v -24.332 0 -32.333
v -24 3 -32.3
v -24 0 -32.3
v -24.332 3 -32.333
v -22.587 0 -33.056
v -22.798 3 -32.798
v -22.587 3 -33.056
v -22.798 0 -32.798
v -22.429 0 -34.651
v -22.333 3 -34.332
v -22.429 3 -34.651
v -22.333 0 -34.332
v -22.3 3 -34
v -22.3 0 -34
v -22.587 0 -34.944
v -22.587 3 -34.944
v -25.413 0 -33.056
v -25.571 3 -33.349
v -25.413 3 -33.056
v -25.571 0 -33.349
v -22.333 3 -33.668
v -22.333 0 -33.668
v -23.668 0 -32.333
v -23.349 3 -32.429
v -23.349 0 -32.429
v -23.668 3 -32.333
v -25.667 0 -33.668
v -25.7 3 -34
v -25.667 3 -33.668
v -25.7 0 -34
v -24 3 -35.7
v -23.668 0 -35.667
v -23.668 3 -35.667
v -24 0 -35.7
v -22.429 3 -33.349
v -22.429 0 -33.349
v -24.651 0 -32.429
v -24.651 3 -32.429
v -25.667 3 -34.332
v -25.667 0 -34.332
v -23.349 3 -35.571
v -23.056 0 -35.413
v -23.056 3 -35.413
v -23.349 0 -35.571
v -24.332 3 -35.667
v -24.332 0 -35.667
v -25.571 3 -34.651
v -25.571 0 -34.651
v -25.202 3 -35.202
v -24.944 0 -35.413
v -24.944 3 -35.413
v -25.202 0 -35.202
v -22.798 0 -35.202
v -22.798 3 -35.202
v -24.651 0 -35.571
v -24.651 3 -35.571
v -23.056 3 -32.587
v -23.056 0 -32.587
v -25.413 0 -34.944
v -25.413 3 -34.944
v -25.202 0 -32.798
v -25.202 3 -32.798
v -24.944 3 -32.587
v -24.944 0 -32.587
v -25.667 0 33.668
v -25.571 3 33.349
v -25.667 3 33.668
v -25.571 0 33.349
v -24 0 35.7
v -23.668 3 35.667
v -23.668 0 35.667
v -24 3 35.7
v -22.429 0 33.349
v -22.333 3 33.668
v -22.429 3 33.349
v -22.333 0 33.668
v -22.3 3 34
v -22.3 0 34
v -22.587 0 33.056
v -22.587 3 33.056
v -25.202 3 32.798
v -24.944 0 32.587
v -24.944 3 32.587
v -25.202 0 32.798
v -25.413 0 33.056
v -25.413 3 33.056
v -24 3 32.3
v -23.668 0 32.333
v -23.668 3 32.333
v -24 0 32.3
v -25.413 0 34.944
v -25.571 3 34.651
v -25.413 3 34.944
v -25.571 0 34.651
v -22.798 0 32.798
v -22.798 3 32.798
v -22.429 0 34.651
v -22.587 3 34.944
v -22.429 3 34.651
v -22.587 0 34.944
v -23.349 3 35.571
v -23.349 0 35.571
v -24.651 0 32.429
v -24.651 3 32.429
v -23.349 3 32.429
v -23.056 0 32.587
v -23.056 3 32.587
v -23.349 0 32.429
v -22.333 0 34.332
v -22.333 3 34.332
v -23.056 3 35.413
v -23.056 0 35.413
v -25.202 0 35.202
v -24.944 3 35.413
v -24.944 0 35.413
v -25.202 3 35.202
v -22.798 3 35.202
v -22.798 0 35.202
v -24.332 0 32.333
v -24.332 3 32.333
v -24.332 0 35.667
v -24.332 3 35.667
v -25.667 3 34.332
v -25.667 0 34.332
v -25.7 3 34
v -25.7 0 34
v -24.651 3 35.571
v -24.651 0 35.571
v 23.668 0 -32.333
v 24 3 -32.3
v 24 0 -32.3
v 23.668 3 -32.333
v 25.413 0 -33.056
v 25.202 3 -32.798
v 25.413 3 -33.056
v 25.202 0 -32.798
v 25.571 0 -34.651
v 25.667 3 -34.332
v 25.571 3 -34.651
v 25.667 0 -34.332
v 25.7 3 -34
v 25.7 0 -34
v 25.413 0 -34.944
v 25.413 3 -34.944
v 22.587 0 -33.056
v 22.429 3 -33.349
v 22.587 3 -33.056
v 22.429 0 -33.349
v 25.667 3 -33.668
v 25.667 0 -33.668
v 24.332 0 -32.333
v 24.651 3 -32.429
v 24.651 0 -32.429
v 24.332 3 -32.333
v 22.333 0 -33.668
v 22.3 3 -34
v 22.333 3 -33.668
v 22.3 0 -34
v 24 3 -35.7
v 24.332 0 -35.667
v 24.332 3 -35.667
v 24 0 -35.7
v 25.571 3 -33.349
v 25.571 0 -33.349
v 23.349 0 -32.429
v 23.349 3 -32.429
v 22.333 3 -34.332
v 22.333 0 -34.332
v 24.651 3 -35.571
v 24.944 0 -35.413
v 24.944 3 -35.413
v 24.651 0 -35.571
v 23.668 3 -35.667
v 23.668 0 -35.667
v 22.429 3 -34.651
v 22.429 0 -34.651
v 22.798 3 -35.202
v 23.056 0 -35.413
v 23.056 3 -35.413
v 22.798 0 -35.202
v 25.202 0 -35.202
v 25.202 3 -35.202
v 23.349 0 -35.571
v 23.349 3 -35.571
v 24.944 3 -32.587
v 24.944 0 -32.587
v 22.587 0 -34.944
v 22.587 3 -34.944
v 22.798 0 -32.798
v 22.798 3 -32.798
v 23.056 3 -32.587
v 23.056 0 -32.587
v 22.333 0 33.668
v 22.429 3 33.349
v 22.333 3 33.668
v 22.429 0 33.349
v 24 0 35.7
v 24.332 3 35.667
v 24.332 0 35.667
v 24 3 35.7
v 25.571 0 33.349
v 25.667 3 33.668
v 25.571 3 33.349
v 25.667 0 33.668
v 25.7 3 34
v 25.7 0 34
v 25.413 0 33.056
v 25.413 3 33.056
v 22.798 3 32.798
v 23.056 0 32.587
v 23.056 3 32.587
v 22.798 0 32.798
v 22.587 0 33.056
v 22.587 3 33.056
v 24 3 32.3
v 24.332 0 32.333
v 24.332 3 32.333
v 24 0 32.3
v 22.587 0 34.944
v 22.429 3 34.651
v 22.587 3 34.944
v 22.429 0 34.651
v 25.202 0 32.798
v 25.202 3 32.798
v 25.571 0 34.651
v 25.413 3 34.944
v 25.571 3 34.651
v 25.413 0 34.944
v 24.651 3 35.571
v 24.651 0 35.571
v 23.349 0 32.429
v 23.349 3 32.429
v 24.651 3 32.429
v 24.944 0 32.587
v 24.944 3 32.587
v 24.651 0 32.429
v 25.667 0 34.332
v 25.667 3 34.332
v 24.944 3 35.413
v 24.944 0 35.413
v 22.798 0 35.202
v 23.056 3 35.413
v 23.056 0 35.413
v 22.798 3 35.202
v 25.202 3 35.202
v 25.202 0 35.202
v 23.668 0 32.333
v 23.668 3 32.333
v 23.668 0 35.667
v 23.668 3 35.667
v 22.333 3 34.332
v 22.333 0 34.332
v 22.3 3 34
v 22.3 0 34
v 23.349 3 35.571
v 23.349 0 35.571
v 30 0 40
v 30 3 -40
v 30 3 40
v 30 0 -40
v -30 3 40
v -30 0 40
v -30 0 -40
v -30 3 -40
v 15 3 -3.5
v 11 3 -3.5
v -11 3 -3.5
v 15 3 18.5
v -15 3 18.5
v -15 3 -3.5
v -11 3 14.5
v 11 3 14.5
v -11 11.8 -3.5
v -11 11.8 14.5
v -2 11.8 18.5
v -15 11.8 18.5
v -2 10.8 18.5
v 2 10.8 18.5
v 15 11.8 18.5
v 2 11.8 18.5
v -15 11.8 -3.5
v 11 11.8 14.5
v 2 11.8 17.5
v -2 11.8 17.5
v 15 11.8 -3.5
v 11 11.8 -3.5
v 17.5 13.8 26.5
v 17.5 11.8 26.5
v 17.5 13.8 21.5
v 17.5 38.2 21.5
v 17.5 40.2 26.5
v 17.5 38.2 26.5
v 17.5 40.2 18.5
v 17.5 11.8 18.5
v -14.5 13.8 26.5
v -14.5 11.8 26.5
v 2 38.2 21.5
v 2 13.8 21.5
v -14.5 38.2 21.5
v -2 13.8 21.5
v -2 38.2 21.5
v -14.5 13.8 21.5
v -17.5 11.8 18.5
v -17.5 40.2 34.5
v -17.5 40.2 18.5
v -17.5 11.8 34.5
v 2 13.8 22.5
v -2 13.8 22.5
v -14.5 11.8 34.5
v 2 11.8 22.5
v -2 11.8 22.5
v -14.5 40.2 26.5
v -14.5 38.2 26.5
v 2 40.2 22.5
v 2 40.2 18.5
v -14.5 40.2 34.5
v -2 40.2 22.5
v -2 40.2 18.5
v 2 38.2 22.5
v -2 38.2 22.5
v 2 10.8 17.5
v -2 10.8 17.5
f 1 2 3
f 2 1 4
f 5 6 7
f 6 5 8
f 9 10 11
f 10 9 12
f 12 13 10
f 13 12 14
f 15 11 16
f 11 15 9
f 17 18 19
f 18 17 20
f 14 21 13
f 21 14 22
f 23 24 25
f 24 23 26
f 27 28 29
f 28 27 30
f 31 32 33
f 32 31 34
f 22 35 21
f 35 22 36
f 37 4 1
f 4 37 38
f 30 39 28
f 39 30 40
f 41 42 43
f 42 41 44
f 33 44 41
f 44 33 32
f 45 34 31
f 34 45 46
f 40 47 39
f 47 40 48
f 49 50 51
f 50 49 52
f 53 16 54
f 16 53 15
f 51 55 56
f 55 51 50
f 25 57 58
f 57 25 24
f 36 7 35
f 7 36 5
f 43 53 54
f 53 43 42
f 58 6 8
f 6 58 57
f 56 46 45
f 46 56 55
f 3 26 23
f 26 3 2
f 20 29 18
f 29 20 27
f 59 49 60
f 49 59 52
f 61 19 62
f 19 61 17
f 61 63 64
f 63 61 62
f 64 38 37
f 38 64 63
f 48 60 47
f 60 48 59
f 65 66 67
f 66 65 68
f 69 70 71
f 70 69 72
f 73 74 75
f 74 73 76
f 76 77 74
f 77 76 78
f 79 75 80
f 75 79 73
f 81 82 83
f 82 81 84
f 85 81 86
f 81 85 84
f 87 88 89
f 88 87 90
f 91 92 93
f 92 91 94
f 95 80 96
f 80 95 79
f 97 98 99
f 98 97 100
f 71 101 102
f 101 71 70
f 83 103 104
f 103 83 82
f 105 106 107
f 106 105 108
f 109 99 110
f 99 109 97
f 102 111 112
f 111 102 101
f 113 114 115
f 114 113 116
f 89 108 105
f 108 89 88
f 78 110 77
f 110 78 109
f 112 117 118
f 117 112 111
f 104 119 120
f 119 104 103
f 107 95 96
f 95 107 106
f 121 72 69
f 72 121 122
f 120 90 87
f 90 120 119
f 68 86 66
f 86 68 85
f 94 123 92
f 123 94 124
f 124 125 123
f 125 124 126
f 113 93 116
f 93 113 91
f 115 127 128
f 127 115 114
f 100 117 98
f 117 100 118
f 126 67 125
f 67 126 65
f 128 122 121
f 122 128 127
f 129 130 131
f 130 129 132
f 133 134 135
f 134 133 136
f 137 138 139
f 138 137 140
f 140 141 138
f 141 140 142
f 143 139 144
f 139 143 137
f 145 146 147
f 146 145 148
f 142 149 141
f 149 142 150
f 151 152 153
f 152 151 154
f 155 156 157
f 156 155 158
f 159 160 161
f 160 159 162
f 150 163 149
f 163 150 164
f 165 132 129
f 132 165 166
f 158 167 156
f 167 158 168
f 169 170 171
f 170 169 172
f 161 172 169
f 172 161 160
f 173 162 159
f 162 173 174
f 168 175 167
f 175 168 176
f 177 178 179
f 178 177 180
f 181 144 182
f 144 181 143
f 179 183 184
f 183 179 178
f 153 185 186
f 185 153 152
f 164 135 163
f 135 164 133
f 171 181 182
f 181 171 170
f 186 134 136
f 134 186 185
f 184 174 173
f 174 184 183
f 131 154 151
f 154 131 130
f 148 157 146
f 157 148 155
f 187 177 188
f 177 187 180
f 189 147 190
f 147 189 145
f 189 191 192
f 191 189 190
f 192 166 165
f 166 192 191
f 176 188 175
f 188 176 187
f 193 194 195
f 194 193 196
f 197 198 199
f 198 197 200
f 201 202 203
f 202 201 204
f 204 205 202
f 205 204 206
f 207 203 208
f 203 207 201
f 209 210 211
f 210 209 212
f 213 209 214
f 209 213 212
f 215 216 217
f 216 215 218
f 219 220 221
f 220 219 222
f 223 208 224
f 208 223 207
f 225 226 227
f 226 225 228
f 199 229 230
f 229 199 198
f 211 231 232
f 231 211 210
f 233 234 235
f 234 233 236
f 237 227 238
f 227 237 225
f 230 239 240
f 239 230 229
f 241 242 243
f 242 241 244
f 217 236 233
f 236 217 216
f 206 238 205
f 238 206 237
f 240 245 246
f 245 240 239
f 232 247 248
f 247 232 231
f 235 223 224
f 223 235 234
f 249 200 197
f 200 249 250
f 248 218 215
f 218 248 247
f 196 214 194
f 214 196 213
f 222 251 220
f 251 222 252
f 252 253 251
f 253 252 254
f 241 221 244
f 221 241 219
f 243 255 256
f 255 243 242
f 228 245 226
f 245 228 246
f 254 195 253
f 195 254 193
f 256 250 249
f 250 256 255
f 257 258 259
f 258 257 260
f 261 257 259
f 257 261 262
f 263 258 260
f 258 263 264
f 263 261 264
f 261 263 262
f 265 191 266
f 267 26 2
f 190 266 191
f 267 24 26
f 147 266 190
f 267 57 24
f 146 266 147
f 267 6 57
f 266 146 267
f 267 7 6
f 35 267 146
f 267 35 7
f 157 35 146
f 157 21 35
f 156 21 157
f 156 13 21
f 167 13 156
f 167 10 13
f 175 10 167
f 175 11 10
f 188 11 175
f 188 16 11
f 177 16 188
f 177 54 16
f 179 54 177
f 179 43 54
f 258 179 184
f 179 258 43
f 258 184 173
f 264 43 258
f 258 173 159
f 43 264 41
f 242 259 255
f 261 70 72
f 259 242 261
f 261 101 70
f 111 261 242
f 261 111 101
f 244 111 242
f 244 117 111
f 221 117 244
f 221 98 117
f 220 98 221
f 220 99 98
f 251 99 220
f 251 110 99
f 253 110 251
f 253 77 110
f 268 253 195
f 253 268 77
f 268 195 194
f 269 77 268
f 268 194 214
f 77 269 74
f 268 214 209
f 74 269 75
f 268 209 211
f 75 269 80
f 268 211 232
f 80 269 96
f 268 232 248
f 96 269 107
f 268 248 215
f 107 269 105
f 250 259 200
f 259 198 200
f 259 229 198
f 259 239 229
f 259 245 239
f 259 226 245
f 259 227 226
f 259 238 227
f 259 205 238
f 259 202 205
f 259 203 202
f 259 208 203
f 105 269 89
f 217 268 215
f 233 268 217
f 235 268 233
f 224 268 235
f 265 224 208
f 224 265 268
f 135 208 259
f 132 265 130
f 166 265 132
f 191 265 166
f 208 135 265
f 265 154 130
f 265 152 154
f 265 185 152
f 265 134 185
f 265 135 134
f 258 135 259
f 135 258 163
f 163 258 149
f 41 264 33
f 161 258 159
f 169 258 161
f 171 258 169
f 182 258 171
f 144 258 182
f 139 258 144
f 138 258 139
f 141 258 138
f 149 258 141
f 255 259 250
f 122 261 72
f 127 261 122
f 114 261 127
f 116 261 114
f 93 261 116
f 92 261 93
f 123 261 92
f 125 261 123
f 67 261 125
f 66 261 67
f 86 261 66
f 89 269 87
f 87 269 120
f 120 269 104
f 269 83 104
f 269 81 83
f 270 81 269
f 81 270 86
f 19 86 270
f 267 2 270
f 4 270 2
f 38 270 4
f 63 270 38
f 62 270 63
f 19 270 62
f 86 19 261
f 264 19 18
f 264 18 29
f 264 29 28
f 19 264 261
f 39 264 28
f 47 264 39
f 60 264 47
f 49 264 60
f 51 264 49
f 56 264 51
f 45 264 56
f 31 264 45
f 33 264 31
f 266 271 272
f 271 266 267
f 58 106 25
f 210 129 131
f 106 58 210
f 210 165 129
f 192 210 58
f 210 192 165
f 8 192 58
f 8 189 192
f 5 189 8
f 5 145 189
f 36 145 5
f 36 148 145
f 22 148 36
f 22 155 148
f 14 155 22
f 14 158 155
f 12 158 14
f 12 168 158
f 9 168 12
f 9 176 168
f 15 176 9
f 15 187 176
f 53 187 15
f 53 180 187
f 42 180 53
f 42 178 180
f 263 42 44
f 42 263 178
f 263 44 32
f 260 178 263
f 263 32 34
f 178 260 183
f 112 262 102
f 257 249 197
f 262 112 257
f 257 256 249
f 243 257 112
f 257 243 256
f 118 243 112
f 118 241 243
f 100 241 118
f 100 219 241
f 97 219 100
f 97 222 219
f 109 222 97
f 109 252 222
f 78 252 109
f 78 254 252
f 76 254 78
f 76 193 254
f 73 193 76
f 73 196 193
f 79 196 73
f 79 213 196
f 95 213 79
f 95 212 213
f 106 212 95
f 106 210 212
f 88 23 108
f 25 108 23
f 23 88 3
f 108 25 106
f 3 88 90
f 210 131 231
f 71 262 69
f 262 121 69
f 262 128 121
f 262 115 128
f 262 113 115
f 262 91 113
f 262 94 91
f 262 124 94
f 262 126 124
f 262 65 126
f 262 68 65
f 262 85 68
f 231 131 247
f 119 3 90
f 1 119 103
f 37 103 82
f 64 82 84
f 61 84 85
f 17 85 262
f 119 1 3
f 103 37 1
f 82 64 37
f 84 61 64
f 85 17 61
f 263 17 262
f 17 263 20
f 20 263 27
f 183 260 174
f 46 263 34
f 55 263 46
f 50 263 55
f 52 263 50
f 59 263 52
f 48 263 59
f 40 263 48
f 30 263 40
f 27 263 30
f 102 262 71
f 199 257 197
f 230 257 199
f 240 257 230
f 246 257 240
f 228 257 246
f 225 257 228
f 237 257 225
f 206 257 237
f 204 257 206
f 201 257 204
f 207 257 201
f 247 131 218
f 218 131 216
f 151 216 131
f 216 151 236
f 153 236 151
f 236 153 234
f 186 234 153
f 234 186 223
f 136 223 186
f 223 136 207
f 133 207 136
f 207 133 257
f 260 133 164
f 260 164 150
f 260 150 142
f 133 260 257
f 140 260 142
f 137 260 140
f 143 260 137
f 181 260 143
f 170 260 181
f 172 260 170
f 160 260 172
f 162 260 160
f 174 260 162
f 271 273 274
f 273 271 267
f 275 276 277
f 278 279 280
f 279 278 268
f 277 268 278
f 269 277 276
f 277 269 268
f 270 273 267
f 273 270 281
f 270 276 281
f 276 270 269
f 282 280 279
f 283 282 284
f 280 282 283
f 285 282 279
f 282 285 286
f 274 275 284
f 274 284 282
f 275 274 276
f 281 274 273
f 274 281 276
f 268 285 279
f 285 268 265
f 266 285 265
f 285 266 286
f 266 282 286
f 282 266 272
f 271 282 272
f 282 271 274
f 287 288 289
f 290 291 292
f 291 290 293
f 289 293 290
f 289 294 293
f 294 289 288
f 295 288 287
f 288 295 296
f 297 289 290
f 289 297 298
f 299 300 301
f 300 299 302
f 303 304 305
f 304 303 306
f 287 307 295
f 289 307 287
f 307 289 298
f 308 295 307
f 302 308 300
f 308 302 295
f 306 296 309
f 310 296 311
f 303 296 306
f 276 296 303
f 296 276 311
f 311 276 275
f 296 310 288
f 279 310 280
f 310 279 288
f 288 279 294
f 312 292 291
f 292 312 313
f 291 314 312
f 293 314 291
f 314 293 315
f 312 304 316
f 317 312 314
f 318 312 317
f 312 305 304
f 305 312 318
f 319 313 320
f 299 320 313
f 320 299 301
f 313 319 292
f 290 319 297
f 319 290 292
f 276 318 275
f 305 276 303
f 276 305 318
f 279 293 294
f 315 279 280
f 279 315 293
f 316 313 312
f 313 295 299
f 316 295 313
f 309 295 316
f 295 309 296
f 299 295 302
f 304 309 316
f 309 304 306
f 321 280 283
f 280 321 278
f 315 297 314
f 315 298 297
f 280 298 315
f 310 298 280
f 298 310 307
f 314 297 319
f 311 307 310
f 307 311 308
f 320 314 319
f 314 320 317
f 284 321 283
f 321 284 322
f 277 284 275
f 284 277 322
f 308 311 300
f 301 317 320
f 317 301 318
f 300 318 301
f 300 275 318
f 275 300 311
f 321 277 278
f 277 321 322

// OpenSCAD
// bracket.scad - servo bracket for the light-switch pusher (Issue #7).
//
// One printed piece: wall plate + shelf + servo cradle. The servo lies
// on its side so its shaft axis is horizontal and parallel to the wall;
// the pusher arm (pusher_arm.scad) rotates in a plane perpendicular to
// the wall and presses the rocker below/in front of the bracket.
//
// Coordinates: origin at the rocker centre on the wall plane.
//   X: right (wall-parallel), Y: out from the wall, Z: up.
// Units: mm. Servo dimensions are nominal SG90-class values; adjust the
// body_* parameters to the actual unit before printing a final version.
//
// Render status: no CAD kernel was available in the build environment;
// open in OpenSCAD and check the preview before slicing.

// ---- Parameters ----
plate_w = 60;          // wall plate width  (X)
plate_h = 80;          // wall plate height (Z)
plate_t = 3;           // wall plate thickness (Y)
shaft_z = 28;          // shaft centre height above rocker centre
shaft_y = 26;          // shaft centre distance out from the wall
body_x = 23.0;         // servo body size along X (its height, on side)
body_y = 22.4;         // servo body size along Y (its length)
body_z = 12.0;         // servo body size along Z (its width, on side)
clr = 0.5;             // clearance around the body
base_t = 3;            // cradle base thickness
lip_h = 5;             // locating lip height on the cradle base
wall_t = 3;            // cradle end-wall thickness
shelf_t = 4;           // shelf thickness (plate to cradle)

$fn = 32;

// ---- Derived ----
base_z = shaft_z - body_z / 2 - clr - base_t;   // cradle base bottom
base_y0 = shaft_y - (body_y / 2 + 3);           // cradle base front edge
base_y1 = shaft_y + (body_y / 2 + 3);           // cradle base back edge
base_x0 = -(body_x / 2 + wall_t + 3);
base_x1 = body_x / 2 + 6;                       // room for the shaft/hub

module wall_plate() {
  difference() {
    translate([-plate_w / 2, 0, -plate_h / 2])
      cube([plate_w, plate_t, plate_h]);
    // Corner holes for screwing the plate to a bench board (rig use).
    // Unused in wall use, where the back is adhesive-mounted.
    for (sx = [-1, 1], sz = [-1, 1])
      translate([sx * (plate_w / 2 - 6), -1, sz * (plate_h / 2 - 6)])
        rotate([-90, 0, 0]) cylinder(h = plate_t + 2, r = 1.7);
  }
}

module shelf() {
  // Horizontal shelf from the plate to the cradle base.
  translate([-15, plate_t, base_z - shelf_t])
    cube([30, base_y0 - plate_t, shelf_t]);
  // Two stiffening ribs under the shelf.
  for (sx = [-1, 1])
    translate([sx * 13 - 2, plate_t, base_z - shelf_t - 18])
      cube([4, base_y0 - plate_t, 18 + shelf_t]);
}

module cradle() {
  // Base slab.
  translate([base_x0, base_y0, base_z])
    cube([base_x1 - base_x0, base_y1 - base_y0, base_t]);
  // End wall on the side opposite the shaft.
  translate([base_x0, base_y0, base_z])
    cube([wall_t, base_y1 - base_y0, base_t + body_z + 2 * clr]);
  // Locating lips along both Y edges.
  for (sy = [0, 1])
    translate([base_x0, sy == 0 ? base_y0 : base_y1 - 2,
               base_z + base_t])
      cube([base_x1 - base_x0, 2, lip_h]);
  // Zip-tie slot across the base to retain the servo (v0 retention).
}

module bracket() {
  difference() {
    union() { wall_plate(); shelf(); cradle(); }
    // Zip-tie slot through the cradle base.
    translate([-2, base_y0 - 1, base_z - 1])
      cube([4, (base_y1 - base_y0) + 2, base_t + 2]);
  }
}

bracket();
